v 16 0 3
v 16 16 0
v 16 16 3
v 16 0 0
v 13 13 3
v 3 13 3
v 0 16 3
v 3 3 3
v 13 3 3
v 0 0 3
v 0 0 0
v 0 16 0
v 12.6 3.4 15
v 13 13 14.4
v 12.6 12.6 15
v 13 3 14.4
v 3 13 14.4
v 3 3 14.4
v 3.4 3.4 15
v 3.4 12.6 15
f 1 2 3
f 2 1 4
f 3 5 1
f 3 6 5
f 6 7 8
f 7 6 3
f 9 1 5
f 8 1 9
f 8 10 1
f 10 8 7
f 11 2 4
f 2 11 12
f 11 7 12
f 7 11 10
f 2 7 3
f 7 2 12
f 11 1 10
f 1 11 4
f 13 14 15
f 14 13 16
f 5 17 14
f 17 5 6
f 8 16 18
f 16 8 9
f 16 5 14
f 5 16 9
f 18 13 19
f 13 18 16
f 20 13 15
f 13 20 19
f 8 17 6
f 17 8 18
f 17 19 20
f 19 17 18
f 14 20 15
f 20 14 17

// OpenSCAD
// file: ../lib/params.scad
// Fit test sizes shared by the coupon and the peg.
// Peg size (mm)
peg = 10; // [8:1:12]
// Coupon thickness (mm)
plate_t = 5; // [3:0.5:8]
/* [Hidden] */
clearances = [0.1, 0.2, 0.3, 0.4]; // per-side clearance of each square hole (mm)
m3_holes = [2.8, 3.0, 3.2, 3.4, 3.6]; // round holes for an M3 screw (mm)
// main file
// Fit test peg: a 10 mm square peg with a grip on top. Push it into each square hole of the coupon.

/* [Hidden] */
include <../lib/params.scad>
$fn = $preview ? 32 : 64;

// grip (printed on the bed), then the peg standing up from it; a small chamfer helps it start
cube([peg + 6, peg + 6, 3]);
translate([3, 3, 3]) hull() {
  cube([peg, peg, 12 - 0.6]);
  translate([0.4, 0.4, 0]) cube([peg - 0.8, peg - 0.8, 12]);
}
